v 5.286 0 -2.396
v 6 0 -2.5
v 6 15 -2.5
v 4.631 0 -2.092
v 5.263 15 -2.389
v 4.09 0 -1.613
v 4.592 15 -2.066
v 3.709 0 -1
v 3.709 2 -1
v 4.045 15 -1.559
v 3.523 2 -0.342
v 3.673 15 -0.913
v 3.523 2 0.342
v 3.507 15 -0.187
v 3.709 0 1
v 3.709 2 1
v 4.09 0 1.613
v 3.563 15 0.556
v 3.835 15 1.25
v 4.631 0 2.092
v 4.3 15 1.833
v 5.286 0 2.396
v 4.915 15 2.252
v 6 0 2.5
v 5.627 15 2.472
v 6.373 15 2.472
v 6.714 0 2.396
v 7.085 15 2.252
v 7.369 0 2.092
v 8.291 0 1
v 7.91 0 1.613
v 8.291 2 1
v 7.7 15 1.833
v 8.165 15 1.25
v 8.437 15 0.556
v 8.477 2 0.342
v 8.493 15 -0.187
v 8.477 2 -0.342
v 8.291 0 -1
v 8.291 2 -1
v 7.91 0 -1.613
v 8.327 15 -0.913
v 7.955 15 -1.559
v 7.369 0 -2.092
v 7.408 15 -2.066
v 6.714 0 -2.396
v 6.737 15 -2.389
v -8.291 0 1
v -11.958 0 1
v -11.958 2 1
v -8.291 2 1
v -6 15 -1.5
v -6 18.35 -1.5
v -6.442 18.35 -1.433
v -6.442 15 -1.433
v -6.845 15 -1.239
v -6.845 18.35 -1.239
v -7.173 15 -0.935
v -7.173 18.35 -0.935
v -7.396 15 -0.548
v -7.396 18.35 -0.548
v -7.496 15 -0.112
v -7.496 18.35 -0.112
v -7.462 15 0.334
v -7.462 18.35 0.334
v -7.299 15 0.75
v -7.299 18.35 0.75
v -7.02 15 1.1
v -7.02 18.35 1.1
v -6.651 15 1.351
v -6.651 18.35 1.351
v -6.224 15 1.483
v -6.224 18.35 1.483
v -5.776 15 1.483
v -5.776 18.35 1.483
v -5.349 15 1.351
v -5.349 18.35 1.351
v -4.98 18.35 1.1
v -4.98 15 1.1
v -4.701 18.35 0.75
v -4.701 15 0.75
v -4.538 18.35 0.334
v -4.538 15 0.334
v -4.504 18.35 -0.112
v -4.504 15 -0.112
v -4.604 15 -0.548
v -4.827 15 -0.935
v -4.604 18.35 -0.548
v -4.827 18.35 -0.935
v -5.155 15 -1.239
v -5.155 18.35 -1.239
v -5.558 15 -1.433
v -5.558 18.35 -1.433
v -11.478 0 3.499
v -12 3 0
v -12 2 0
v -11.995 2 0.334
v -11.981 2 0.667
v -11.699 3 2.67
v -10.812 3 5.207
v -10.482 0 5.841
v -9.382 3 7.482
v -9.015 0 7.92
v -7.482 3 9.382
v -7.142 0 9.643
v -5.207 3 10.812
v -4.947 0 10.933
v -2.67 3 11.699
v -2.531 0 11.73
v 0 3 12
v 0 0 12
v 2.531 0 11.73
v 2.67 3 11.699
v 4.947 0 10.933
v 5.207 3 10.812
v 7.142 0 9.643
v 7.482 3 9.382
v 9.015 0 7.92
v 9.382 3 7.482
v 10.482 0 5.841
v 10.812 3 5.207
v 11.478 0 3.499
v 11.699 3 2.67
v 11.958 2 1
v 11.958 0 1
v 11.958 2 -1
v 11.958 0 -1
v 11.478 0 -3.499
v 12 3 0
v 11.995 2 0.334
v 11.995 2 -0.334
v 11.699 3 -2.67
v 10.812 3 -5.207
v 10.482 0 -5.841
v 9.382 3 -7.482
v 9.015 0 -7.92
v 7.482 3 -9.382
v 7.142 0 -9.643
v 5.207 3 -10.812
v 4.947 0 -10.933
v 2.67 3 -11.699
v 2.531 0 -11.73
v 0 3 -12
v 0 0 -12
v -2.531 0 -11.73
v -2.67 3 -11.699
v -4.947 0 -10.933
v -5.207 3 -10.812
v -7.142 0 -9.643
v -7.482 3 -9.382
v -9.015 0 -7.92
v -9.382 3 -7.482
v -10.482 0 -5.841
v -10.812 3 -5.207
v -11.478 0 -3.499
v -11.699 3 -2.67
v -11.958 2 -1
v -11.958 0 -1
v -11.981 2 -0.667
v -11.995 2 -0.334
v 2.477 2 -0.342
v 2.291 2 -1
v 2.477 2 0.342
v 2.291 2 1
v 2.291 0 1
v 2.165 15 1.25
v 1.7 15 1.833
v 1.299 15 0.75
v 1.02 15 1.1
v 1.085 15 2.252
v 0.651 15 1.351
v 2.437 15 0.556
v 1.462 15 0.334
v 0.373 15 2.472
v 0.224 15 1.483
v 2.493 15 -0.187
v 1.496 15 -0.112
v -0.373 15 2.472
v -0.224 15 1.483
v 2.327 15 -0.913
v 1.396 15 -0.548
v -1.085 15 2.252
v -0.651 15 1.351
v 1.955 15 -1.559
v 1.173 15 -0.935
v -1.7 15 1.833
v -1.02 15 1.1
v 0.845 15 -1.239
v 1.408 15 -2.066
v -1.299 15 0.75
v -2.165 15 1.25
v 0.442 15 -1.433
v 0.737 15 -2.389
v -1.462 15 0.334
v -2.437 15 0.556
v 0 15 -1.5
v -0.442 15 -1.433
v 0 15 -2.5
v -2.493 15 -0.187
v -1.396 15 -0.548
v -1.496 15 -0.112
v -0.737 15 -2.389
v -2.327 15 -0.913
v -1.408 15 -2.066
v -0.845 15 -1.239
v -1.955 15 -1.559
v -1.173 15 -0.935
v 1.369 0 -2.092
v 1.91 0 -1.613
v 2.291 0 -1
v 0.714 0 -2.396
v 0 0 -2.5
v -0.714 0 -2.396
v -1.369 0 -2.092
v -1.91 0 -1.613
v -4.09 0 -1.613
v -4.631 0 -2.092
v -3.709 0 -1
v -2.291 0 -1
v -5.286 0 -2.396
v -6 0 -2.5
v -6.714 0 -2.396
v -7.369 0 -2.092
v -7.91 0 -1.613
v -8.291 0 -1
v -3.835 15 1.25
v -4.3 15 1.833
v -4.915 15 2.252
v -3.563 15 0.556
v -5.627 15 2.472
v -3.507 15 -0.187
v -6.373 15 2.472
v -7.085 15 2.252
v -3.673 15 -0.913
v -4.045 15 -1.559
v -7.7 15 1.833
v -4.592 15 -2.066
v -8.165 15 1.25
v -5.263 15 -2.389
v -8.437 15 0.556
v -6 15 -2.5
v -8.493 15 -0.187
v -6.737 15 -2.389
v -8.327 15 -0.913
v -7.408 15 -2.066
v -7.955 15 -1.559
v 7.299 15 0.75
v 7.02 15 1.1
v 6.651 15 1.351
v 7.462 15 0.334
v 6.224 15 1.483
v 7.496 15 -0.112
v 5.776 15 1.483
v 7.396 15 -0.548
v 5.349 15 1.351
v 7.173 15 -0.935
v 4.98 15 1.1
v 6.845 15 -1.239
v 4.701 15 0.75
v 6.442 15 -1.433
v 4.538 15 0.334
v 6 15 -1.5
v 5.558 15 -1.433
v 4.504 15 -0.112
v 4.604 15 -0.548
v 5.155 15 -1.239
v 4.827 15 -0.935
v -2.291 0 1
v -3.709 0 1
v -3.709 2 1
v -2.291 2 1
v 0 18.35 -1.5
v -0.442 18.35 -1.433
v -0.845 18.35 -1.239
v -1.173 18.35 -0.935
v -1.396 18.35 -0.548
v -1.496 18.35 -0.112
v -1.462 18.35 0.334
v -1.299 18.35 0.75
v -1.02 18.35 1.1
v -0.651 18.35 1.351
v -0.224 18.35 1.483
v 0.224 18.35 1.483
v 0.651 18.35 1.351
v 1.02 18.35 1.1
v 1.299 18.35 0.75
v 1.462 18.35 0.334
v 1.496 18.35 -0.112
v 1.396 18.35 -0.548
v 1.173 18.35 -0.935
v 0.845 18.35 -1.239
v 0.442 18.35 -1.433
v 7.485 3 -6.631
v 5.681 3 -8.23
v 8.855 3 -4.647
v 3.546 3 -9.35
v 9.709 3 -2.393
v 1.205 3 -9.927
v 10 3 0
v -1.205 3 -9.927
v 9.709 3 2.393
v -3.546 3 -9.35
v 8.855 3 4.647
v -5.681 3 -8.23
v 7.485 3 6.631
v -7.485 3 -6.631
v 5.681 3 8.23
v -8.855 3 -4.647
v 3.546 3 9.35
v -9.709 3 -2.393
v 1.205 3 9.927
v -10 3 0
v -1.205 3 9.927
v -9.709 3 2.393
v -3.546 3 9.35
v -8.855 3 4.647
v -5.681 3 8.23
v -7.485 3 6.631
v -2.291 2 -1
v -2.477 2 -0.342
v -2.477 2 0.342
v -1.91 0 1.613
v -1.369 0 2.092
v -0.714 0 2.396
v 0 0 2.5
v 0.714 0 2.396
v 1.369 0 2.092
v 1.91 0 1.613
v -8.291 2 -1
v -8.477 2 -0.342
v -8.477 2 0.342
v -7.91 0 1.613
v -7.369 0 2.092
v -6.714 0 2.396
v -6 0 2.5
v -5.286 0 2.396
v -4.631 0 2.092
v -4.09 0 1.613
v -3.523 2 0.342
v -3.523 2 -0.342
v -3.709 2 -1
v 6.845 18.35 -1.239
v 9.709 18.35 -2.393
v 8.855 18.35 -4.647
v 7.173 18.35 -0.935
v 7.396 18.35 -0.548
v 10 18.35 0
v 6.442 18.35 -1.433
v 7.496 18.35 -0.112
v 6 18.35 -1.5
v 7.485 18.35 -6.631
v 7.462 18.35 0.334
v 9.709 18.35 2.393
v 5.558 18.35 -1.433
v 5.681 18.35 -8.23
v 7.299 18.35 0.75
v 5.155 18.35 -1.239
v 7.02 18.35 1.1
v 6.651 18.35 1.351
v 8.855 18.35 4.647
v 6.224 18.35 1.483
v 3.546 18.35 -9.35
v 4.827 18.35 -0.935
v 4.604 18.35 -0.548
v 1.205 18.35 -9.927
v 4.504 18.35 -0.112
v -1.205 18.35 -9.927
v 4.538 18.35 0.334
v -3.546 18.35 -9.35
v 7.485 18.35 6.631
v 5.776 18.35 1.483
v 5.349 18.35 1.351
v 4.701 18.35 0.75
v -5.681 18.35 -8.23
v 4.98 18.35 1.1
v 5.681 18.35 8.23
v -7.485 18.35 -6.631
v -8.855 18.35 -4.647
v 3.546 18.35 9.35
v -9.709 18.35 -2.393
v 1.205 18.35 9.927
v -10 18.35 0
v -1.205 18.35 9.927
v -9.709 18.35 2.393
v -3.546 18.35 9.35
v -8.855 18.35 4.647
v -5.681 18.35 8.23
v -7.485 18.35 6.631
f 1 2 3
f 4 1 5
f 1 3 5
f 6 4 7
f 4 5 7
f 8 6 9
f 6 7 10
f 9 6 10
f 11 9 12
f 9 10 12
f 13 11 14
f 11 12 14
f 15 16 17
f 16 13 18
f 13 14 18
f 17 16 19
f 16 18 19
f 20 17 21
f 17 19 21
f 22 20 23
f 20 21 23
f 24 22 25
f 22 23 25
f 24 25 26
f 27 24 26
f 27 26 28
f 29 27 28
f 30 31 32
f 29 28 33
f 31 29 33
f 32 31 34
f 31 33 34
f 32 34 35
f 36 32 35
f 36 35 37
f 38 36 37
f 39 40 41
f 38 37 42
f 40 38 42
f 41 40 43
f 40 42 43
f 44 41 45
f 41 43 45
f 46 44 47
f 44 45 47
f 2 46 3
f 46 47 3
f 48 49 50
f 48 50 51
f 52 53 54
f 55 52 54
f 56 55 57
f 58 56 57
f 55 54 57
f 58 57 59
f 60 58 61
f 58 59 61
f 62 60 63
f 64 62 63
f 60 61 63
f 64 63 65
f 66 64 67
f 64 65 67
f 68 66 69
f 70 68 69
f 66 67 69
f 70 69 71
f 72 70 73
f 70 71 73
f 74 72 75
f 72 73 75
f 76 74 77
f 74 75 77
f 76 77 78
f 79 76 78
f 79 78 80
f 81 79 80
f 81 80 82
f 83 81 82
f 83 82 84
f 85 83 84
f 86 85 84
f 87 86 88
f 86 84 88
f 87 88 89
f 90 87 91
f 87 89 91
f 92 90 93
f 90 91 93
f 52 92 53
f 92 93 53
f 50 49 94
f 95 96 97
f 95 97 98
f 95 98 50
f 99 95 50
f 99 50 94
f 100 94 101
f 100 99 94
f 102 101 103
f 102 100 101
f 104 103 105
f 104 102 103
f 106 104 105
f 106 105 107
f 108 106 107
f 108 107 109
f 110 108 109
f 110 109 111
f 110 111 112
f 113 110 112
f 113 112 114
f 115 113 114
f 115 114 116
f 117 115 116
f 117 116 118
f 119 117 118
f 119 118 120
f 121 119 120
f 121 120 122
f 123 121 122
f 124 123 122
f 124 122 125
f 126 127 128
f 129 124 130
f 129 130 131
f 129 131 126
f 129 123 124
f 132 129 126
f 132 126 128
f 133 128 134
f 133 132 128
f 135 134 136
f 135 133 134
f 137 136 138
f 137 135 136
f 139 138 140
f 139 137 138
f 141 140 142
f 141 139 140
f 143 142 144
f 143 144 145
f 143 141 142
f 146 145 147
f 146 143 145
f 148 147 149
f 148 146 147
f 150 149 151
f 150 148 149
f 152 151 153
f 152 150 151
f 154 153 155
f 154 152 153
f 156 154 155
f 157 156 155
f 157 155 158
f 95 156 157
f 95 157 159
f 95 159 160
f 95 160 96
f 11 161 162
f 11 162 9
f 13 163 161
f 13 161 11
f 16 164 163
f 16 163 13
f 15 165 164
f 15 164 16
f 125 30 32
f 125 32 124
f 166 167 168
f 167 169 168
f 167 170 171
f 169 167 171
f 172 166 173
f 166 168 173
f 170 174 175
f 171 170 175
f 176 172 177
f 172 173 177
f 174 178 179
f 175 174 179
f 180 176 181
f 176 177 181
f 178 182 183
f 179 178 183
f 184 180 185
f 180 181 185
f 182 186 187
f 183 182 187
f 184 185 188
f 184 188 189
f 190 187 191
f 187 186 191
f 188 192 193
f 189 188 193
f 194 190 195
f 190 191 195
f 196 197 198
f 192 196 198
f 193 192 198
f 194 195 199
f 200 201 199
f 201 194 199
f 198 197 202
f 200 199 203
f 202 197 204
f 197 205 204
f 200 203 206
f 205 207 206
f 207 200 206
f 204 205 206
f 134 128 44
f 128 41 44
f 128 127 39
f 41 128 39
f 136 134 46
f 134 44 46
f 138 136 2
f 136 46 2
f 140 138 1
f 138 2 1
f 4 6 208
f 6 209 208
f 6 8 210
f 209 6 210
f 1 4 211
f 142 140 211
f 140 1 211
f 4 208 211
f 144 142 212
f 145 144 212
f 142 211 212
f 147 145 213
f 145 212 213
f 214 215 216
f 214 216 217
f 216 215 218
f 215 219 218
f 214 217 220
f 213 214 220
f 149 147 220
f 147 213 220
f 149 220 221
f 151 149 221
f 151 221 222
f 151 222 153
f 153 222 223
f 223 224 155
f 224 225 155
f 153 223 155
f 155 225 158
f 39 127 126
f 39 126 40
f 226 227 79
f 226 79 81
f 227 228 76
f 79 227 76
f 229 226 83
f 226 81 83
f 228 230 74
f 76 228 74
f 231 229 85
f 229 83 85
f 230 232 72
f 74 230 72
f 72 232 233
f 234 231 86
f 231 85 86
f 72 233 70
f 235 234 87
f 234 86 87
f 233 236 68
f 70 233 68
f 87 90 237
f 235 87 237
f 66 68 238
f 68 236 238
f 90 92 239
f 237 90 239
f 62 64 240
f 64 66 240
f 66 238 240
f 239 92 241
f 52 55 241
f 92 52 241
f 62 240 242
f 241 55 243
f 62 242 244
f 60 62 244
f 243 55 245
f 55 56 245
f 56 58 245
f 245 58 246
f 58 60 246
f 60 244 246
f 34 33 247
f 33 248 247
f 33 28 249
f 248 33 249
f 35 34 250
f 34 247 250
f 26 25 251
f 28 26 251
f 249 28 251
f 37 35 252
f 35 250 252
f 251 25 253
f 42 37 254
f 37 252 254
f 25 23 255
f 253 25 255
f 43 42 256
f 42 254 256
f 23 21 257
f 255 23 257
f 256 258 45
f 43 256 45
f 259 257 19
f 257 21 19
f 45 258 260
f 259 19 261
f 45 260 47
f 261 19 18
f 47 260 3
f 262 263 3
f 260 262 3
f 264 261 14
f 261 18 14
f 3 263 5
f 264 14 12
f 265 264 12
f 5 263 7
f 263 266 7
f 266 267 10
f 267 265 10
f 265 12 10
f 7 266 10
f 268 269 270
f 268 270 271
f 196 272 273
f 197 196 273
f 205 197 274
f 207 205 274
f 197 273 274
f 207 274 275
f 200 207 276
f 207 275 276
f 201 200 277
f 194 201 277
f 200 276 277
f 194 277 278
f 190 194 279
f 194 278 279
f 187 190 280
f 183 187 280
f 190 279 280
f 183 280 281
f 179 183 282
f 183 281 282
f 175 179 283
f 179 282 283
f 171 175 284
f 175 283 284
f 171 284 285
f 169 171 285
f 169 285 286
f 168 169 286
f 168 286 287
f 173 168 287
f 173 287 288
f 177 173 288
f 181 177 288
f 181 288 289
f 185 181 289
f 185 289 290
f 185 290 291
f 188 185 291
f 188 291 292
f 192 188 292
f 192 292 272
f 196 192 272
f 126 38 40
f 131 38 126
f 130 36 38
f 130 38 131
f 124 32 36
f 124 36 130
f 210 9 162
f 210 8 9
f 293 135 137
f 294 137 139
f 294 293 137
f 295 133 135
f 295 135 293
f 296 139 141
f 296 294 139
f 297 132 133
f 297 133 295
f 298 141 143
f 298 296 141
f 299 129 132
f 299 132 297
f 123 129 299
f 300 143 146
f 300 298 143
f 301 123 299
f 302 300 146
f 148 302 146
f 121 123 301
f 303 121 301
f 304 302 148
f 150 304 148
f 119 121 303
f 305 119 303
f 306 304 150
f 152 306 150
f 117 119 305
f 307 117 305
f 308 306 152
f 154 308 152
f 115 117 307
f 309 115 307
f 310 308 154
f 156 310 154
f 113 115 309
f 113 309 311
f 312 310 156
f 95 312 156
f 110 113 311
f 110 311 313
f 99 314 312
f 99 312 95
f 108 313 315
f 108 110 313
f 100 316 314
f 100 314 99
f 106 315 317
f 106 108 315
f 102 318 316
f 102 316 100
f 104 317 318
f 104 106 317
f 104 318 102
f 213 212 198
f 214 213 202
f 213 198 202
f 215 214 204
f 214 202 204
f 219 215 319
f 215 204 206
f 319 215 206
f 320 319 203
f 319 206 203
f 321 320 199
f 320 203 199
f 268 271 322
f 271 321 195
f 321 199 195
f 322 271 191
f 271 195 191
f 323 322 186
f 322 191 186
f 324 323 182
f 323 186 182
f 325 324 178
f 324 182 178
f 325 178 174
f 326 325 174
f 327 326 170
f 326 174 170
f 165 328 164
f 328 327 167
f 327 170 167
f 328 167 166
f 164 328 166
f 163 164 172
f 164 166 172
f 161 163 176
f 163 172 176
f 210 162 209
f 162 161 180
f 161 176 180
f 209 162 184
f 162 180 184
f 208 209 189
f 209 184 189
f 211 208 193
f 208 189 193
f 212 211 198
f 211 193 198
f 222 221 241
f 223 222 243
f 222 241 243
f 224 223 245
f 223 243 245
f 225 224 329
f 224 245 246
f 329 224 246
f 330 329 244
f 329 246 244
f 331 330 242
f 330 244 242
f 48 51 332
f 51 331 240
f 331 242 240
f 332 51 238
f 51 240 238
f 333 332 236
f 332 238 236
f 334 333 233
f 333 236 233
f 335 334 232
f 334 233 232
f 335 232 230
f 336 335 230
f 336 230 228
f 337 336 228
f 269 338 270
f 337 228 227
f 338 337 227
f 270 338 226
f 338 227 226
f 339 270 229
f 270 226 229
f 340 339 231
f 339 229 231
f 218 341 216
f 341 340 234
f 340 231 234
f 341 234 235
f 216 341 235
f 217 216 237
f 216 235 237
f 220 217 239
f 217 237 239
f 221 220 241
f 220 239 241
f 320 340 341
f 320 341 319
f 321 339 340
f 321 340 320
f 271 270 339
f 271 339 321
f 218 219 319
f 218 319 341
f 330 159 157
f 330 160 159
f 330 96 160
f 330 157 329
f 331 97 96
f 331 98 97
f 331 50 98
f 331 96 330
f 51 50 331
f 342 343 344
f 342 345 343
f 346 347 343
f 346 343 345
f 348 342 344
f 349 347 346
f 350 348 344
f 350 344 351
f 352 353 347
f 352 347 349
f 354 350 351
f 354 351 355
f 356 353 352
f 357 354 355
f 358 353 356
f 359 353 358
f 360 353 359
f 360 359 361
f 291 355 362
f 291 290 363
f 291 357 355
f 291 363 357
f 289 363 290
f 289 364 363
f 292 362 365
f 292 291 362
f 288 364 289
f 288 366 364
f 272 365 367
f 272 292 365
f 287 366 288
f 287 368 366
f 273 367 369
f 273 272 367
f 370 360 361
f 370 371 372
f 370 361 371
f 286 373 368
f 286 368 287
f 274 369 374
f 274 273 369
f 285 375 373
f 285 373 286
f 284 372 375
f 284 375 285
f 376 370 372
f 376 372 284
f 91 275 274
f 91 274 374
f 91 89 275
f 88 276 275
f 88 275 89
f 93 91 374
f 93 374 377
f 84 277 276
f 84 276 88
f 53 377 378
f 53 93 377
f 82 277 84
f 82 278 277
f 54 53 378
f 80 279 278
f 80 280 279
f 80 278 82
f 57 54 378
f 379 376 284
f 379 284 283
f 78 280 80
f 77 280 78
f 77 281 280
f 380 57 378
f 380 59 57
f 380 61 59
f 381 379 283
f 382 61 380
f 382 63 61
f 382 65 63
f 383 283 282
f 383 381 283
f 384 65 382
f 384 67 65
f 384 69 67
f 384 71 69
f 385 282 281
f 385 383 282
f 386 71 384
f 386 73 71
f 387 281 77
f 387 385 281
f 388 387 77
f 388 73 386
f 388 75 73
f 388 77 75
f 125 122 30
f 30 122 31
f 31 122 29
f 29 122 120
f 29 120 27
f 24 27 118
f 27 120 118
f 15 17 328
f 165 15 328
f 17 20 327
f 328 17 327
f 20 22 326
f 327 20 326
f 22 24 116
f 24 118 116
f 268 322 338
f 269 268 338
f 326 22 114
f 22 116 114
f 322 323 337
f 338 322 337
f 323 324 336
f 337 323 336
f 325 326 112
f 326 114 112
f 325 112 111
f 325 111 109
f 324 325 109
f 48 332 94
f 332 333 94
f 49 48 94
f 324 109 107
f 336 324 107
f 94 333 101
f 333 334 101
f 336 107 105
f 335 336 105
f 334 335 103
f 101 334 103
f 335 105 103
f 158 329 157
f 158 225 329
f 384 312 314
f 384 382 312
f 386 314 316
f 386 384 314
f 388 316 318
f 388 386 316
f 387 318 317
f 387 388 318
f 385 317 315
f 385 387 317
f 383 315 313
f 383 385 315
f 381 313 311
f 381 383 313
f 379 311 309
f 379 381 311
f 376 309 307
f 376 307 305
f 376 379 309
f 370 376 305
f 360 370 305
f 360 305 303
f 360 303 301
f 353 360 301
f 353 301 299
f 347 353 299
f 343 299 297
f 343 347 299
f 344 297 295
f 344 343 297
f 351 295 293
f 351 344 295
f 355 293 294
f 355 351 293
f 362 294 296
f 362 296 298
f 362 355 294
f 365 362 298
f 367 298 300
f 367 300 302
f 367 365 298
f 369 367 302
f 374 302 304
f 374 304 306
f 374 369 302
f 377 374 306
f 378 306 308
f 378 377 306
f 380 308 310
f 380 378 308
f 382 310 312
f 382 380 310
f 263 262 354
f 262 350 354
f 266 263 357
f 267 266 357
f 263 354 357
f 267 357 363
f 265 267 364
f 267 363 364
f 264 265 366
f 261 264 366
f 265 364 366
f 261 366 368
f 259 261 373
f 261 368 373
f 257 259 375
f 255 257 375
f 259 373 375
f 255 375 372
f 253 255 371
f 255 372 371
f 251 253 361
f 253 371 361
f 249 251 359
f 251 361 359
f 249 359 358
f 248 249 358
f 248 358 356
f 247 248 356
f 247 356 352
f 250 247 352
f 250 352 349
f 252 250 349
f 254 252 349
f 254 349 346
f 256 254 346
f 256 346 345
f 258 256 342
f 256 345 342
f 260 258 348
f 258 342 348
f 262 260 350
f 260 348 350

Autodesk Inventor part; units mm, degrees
ref_plane "YZ Plane" through (0, 0, 0) normal (1, 0, 0) x (0, 1, 0)
ref_plane "XZ Plane" through (0, 0, 0) normal (0, 1, 0) x (-1, 0, 0)
ref_plane "XY Plane" through (0, 0, 0) normal (0, 0, 1) x (1, 0, 0)
sketch "Sketch1" plane through (0, 0, 0) normal (0, 0, 1) x (1, 0, 0)
  line L0 (0, 0) -> (0, 18.35)
  line L1 (0, 0) -> (-12, 0)
  line L2 (-12, 0) -> (-12, 3)
  line L3 (-12, 3) -> (-10, 3)
  line L4 (-10, 3) -> (-10, 18.35)
  line L5 (-10, 18.35) -> (0, 18.35)
  dimension "d0" = 20
  dimension "d1" = 24
  dimension "d2" = 3
  dimension "d3" = 18.35
revolve "Revolution1" add sketch "Sketch1" angle 360 about axis through (0, 0, 0) along (0, 1, 0)
sketch "Sketch2" plane through (0, 0, 0) normal (0, -1, 0) x (1, 0, 0)
  point P0 (0, 0)
  point P1 (0, 0)
  point P2 (6, 0)
  point P3 (-6, 0)
  dimension "d6" = 6
  dimension "d7" = 6
hole "Hole1" at (0, 0, 0) at (6, 0, 0) at (-6, 0, 0) direction (0, 1, 0) diameter 3 end through all counterbore diameter 5 counterbore depth 15
sketch "Sketch3" plane through (0, 0, 0) normal (0, -1, 0) x (1, 0, 0)
  line L0 (-15, 1) -> (15, 1)
  line L1 (15, 1) -> (15, -1)
  line L2 (15, -1) -> (-15, -1)
  line L3 (-15, -1) -> (-15, 1)
  line L4 (-15, 1) -> (15, -1) construction
  line L5 (15, 1) -> (-15, -1) construction
  point P0 (0, 0)
  dimension "d15" = 30
  dimension "d16" = 2
extrude "Extrusion1" cut sketch "Sketch3" against normal blind 2
equation "\"d7\" = d6"
properties part number "019" material "PAEK Plastic"
